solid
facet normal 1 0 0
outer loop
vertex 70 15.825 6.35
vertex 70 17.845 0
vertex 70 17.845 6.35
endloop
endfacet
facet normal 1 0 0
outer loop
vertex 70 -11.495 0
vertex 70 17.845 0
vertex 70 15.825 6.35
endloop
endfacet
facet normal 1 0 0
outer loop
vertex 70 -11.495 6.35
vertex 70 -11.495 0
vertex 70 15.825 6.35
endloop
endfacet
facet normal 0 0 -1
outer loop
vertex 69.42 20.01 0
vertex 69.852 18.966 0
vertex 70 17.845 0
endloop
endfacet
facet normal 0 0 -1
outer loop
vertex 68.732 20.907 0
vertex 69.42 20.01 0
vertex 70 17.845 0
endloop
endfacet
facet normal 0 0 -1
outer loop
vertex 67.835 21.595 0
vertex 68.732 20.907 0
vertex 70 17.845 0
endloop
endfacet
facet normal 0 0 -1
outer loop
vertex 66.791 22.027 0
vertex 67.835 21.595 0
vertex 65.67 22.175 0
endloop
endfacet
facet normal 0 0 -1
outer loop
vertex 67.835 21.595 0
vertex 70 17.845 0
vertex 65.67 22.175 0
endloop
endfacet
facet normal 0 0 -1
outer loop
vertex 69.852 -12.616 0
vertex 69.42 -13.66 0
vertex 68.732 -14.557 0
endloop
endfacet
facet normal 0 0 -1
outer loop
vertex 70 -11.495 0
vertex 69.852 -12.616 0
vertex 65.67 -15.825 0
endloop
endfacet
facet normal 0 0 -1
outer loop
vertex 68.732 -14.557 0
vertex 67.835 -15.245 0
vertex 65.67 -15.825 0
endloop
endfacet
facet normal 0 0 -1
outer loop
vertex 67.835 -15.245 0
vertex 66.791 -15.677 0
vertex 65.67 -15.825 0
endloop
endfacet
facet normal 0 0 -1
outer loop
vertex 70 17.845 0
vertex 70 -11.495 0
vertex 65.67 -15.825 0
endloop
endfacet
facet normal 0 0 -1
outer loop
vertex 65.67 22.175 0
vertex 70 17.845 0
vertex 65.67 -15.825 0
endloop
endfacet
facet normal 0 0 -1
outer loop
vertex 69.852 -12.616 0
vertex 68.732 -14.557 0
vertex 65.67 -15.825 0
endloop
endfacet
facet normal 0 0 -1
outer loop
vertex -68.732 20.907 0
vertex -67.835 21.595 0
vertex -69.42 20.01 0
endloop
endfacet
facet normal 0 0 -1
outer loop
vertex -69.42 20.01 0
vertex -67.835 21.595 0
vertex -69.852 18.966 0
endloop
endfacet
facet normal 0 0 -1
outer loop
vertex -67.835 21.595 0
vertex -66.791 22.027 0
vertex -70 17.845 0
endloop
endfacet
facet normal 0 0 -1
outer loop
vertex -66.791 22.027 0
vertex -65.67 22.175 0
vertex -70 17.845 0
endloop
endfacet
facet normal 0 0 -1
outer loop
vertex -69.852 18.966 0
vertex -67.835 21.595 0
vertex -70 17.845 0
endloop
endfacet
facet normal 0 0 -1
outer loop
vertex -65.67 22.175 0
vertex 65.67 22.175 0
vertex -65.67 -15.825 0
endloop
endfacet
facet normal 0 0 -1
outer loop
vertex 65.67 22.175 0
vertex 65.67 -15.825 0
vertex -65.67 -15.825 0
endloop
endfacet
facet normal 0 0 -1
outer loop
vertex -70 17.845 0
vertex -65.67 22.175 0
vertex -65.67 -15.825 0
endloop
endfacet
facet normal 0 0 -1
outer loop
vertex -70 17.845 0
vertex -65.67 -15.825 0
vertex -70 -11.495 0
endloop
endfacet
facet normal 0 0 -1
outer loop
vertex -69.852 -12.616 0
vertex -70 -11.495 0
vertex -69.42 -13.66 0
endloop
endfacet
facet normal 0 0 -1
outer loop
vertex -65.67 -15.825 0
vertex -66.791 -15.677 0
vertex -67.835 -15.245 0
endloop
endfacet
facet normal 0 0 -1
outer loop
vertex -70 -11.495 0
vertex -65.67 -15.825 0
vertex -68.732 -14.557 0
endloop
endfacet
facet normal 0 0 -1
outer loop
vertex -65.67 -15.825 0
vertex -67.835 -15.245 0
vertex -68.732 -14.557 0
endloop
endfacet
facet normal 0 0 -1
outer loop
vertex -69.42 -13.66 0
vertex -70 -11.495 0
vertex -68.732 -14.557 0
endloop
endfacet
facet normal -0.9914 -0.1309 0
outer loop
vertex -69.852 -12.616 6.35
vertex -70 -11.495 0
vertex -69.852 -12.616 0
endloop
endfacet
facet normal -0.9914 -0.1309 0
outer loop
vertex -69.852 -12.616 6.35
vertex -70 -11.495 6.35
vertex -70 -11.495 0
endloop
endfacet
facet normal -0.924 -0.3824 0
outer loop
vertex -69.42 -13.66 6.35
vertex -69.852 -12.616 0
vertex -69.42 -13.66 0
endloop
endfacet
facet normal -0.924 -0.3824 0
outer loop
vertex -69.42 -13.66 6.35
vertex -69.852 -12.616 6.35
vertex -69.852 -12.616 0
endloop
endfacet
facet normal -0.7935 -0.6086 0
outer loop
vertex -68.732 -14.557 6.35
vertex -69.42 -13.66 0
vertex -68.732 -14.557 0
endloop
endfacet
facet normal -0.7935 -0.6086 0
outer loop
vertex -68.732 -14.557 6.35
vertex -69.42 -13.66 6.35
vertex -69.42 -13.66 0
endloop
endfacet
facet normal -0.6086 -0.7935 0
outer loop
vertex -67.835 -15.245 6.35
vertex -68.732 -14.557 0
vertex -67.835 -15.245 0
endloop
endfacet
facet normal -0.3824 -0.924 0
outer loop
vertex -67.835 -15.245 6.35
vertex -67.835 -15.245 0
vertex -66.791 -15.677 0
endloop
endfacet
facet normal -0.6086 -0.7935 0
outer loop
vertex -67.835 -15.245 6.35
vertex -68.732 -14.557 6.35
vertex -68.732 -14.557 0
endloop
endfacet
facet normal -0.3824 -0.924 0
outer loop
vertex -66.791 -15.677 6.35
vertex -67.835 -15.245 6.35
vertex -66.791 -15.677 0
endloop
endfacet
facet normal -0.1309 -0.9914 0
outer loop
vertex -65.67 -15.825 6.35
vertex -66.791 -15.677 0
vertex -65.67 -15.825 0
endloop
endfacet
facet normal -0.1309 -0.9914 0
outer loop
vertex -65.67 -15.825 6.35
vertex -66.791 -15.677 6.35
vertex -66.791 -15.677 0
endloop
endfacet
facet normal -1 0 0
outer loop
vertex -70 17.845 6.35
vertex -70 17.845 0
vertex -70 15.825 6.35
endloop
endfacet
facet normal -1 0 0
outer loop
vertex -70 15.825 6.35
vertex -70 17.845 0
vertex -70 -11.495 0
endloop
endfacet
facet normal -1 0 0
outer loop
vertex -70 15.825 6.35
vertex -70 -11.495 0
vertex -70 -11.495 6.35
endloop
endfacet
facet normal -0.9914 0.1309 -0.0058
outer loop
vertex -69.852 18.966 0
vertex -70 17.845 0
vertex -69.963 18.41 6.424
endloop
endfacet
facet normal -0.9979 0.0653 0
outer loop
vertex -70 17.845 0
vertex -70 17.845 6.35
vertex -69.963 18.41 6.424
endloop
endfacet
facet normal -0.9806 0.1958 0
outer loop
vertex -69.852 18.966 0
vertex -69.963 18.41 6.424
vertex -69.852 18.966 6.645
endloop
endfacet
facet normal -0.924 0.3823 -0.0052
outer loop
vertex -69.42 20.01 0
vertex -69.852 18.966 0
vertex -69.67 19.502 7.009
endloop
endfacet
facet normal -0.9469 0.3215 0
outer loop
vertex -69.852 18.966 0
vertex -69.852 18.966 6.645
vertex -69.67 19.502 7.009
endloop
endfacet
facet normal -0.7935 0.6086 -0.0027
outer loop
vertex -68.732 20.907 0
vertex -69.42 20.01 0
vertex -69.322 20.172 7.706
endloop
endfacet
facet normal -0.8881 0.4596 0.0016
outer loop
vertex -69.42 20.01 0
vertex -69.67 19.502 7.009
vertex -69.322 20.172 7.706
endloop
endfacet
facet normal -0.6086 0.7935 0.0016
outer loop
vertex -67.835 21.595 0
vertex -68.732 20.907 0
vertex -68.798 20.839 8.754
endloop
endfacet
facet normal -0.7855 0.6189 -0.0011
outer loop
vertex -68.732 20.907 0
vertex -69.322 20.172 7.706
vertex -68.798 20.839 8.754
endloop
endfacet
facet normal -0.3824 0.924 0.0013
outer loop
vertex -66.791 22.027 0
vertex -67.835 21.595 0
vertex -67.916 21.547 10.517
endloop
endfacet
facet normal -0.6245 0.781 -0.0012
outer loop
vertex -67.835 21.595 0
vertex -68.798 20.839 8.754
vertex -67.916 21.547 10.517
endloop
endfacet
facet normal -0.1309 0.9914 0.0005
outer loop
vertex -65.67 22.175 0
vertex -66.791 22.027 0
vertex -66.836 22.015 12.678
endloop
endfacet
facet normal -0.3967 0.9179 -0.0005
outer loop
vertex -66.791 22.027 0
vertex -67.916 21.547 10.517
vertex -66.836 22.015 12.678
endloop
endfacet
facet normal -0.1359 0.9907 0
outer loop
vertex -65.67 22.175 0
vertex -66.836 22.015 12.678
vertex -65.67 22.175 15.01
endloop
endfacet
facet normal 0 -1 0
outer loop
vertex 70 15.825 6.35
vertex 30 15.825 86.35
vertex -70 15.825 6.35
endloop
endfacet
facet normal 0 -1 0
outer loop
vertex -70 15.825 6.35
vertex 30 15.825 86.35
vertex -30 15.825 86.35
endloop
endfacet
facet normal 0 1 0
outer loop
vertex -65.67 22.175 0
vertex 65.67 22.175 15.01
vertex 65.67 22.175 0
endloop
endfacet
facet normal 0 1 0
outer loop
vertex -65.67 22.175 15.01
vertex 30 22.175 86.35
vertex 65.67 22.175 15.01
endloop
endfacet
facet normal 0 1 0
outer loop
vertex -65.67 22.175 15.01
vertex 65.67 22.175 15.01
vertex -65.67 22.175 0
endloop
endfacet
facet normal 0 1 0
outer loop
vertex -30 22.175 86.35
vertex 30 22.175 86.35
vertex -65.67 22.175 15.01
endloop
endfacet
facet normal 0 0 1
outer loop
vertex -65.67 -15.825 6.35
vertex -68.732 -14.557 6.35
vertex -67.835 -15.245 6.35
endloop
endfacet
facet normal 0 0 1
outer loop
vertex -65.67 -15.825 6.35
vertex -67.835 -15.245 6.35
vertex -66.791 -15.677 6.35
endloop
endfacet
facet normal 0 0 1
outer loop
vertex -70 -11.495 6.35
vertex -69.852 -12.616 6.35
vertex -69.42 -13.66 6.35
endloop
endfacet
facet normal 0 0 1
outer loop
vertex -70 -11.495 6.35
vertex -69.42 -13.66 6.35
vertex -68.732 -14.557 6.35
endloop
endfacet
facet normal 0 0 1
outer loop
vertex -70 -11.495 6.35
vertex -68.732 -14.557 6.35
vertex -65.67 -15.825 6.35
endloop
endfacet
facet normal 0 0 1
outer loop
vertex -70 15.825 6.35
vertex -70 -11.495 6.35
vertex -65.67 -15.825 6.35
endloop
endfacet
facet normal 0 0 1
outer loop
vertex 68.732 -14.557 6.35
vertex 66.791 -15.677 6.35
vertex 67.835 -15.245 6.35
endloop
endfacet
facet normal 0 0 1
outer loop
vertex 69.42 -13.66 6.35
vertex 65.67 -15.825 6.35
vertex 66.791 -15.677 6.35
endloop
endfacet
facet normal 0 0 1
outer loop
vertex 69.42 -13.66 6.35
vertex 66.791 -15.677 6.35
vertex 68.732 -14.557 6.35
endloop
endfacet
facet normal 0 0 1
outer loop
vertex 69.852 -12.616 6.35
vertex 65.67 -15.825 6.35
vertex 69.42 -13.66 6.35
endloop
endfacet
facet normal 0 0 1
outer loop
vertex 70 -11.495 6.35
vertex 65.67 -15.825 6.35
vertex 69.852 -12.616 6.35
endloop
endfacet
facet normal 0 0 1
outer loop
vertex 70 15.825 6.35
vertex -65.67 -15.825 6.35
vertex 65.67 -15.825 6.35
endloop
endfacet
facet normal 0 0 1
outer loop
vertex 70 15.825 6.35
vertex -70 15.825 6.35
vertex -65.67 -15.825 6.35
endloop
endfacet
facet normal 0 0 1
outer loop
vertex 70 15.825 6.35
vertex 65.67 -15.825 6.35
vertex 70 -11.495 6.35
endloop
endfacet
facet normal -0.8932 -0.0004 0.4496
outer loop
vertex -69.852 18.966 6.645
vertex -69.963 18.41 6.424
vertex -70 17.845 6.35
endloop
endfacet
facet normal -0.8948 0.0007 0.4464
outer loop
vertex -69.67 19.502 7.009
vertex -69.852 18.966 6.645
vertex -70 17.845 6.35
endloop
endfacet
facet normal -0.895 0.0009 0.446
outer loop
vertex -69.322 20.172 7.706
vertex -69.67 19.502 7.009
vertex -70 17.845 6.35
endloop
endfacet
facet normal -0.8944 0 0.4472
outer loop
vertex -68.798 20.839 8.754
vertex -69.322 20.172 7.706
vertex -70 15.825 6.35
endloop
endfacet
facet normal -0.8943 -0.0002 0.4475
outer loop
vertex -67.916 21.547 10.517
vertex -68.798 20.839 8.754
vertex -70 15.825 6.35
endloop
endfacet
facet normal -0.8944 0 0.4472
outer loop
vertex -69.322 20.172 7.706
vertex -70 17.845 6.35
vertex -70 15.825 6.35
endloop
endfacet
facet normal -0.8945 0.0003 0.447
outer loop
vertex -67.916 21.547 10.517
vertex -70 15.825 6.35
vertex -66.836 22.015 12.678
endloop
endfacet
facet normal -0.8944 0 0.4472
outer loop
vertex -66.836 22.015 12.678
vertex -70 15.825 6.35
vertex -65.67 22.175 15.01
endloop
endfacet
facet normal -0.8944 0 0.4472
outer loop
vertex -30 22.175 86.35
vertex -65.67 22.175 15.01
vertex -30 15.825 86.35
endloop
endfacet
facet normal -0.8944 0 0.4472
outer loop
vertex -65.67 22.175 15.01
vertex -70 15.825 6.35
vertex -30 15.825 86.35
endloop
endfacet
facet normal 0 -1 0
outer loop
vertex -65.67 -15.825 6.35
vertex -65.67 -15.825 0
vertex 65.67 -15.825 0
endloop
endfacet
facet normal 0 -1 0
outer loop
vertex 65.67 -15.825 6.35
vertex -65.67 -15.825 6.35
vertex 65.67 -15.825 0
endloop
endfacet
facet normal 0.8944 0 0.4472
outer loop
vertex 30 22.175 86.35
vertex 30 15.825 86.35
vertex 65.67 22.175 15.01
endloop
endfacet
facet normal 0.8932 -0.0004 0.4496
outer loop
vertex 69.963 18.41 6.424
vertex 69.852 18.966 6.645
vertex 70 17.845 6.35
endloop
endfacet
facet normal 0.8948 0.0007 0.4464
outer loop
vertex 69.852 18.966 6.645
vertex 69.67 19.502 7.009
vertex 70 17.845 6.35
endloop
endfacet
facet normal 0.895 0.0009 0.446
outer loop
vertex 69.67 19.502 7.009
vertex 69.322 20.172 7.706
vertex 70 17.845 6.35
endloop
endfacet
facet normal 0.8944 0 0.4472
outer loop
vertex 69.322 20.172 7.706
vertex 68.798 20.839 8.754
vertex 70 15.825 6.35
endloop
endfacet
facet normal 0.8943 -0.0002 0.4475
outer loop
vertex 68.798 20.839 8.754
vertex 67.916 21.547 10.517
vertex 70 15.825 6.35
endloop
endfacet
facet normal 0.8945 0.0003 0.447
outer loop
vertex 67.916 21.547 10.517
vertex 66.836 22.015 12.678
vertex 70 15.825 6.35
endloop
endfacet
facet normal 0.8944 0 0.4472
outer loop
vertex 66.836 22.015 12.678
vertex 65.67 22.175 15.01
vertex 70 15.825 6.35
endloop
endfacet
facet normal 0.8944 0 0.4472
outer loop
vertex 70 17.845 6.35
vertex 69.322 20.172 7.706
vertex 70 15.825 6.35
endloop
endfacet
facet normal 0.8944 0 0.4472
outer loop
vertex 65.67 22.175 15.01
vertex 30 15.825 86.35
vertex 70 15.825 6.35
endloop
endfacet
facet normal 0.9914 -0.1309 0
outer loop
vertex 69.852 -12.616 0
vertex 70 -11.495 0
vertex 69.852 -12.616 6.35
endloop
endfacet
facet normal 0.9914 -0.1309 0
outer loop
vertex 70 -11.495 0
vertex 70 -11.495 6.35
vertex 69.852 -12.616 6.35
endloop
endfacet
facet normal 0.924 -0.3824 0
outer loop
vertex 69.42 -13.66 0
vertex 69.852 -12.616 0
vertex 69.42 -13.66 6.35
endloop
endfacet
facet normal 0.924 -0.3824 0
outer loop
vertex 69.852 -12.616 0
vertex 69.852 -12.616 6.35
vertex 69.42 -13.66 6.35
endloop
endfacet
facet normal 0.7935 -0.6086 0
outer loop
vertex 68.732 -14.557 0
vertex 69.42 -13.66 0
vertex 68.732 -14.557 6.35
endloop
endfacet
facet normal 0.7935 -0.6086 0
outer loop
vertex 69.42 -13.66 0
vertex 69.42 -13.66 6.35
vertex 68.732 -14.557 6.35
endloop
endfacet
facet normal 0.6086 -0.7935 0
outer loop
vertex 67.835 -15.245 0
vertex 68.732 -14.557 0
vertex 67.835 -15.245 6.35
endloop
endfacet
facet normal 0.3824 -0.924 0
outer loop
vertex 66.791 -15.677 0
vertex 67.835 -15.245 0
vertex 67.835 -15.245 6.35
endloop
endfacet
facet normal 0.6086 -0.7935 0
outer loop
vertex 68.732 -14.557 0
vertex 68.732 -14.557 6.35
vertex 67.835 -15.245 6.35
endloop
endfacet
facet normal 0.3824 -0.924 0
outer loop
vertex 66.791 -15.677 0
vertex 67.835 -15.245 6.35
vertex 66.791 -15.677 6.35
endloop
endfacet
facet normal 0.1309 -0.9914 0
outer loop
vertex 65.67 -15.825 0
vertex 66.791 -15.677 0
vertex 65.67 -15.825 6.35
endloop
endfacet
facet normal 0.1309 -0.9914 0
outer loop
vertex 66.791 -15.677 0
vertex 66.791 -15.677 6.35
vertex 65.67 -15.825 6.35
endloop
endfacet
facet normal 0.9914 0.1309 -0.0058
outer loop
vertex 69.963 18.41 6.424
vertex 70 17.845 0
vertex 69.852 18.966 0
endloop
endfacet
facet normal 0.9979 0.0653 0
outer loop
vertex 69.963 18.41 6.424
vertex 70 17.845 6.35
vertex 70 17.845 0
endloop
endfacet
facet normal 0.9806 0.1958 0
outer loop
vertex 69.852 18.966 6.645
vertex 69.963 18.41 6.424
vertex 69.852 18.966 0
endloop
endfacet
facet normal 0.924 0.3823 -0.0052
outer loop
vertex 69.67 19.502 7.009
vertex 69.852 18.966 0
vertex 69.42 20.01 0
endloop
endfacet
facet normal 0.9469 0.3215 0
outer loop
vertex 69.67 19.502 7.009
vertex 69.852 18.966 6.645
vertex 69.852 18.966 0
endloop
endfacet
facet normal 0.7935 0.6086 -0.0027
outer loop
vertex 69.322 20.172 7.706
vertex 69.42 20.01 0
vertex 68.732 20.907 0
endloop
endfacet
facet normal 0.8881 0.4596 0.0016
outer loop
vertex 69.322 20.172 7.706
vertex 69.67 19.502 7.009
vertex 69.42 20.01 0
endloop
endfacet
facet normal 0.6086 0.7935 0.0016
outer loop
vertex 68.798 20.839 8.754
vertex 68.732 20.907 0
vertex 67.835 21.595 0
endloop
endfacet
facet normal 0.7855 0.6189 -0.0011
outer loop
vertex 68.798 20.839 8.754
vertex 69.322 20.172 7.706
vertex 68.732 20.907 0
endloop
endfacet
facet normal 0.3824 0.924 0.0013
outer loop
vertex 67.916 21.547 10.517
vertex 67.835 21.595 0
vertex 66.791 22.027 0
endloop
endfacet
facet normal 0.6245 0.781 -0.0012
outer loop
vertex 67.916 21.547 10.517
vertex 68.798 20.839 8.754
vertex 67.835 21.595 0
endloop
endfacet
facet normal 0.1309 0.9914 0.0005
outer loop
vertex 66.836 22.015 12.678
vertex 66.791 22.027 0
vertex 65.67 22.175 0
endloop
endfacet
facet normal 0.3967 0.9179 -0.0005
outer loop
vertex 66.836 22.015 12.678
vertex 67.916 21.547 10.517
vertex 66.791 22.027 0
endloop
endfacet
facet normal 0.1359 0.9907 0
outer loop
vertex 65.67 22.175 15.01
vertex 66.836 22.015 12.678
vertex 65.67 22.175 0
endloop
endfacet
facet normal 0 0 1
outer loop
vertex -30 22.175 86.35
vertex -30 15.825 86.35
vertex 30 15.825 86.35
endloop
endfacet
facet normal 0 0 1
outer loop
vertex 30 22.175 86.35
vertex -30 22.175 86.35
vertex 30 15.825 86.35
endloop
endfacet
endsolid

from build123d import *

# Parameters (mm, degrees)
F0_W     = 140
F0_H     = 31.65
F1_DEPTH = 6.35
F2_W     = 140
F2_H     = 6.35
F3_DEPTH = 6.35
F4_R     = 4.33


with BuildPart() as f1:
    # F0 (on Top) → F1 (new body)
    with BuildSketch(Plane.XY):
        Rectangle(F0_W, F0_H)
    extrude(amount=F1_DEPTH)

    # F2 (on face) → F3 (join)
    with BuildSketch(Plane(origin=(0, 15.825, 0), x_dir=(-1, 0, 0), z_dir=(0, 1, 0))):
        with Locations((0, 3.175)):
            Rectangle(F2_W, F2_H)
        Polygon((-30, 86.35), (-70, 6.35), (70, 6.35), (30, 86.35), align=None)
    extrude(amount=F3_DEPTH)

    # F4
    f4_edges = [f1.edges().sort_by_distance(p)[0] for p in [
        (-70, -15.825, 3.175),
        (70, -15.825, 3.175),
        (70, 22.175, 3.175),
        (-70, 22.175, 3.175),
    ]]
    fillet(f4_edges, radius=F4_R)


solid = f1.part
